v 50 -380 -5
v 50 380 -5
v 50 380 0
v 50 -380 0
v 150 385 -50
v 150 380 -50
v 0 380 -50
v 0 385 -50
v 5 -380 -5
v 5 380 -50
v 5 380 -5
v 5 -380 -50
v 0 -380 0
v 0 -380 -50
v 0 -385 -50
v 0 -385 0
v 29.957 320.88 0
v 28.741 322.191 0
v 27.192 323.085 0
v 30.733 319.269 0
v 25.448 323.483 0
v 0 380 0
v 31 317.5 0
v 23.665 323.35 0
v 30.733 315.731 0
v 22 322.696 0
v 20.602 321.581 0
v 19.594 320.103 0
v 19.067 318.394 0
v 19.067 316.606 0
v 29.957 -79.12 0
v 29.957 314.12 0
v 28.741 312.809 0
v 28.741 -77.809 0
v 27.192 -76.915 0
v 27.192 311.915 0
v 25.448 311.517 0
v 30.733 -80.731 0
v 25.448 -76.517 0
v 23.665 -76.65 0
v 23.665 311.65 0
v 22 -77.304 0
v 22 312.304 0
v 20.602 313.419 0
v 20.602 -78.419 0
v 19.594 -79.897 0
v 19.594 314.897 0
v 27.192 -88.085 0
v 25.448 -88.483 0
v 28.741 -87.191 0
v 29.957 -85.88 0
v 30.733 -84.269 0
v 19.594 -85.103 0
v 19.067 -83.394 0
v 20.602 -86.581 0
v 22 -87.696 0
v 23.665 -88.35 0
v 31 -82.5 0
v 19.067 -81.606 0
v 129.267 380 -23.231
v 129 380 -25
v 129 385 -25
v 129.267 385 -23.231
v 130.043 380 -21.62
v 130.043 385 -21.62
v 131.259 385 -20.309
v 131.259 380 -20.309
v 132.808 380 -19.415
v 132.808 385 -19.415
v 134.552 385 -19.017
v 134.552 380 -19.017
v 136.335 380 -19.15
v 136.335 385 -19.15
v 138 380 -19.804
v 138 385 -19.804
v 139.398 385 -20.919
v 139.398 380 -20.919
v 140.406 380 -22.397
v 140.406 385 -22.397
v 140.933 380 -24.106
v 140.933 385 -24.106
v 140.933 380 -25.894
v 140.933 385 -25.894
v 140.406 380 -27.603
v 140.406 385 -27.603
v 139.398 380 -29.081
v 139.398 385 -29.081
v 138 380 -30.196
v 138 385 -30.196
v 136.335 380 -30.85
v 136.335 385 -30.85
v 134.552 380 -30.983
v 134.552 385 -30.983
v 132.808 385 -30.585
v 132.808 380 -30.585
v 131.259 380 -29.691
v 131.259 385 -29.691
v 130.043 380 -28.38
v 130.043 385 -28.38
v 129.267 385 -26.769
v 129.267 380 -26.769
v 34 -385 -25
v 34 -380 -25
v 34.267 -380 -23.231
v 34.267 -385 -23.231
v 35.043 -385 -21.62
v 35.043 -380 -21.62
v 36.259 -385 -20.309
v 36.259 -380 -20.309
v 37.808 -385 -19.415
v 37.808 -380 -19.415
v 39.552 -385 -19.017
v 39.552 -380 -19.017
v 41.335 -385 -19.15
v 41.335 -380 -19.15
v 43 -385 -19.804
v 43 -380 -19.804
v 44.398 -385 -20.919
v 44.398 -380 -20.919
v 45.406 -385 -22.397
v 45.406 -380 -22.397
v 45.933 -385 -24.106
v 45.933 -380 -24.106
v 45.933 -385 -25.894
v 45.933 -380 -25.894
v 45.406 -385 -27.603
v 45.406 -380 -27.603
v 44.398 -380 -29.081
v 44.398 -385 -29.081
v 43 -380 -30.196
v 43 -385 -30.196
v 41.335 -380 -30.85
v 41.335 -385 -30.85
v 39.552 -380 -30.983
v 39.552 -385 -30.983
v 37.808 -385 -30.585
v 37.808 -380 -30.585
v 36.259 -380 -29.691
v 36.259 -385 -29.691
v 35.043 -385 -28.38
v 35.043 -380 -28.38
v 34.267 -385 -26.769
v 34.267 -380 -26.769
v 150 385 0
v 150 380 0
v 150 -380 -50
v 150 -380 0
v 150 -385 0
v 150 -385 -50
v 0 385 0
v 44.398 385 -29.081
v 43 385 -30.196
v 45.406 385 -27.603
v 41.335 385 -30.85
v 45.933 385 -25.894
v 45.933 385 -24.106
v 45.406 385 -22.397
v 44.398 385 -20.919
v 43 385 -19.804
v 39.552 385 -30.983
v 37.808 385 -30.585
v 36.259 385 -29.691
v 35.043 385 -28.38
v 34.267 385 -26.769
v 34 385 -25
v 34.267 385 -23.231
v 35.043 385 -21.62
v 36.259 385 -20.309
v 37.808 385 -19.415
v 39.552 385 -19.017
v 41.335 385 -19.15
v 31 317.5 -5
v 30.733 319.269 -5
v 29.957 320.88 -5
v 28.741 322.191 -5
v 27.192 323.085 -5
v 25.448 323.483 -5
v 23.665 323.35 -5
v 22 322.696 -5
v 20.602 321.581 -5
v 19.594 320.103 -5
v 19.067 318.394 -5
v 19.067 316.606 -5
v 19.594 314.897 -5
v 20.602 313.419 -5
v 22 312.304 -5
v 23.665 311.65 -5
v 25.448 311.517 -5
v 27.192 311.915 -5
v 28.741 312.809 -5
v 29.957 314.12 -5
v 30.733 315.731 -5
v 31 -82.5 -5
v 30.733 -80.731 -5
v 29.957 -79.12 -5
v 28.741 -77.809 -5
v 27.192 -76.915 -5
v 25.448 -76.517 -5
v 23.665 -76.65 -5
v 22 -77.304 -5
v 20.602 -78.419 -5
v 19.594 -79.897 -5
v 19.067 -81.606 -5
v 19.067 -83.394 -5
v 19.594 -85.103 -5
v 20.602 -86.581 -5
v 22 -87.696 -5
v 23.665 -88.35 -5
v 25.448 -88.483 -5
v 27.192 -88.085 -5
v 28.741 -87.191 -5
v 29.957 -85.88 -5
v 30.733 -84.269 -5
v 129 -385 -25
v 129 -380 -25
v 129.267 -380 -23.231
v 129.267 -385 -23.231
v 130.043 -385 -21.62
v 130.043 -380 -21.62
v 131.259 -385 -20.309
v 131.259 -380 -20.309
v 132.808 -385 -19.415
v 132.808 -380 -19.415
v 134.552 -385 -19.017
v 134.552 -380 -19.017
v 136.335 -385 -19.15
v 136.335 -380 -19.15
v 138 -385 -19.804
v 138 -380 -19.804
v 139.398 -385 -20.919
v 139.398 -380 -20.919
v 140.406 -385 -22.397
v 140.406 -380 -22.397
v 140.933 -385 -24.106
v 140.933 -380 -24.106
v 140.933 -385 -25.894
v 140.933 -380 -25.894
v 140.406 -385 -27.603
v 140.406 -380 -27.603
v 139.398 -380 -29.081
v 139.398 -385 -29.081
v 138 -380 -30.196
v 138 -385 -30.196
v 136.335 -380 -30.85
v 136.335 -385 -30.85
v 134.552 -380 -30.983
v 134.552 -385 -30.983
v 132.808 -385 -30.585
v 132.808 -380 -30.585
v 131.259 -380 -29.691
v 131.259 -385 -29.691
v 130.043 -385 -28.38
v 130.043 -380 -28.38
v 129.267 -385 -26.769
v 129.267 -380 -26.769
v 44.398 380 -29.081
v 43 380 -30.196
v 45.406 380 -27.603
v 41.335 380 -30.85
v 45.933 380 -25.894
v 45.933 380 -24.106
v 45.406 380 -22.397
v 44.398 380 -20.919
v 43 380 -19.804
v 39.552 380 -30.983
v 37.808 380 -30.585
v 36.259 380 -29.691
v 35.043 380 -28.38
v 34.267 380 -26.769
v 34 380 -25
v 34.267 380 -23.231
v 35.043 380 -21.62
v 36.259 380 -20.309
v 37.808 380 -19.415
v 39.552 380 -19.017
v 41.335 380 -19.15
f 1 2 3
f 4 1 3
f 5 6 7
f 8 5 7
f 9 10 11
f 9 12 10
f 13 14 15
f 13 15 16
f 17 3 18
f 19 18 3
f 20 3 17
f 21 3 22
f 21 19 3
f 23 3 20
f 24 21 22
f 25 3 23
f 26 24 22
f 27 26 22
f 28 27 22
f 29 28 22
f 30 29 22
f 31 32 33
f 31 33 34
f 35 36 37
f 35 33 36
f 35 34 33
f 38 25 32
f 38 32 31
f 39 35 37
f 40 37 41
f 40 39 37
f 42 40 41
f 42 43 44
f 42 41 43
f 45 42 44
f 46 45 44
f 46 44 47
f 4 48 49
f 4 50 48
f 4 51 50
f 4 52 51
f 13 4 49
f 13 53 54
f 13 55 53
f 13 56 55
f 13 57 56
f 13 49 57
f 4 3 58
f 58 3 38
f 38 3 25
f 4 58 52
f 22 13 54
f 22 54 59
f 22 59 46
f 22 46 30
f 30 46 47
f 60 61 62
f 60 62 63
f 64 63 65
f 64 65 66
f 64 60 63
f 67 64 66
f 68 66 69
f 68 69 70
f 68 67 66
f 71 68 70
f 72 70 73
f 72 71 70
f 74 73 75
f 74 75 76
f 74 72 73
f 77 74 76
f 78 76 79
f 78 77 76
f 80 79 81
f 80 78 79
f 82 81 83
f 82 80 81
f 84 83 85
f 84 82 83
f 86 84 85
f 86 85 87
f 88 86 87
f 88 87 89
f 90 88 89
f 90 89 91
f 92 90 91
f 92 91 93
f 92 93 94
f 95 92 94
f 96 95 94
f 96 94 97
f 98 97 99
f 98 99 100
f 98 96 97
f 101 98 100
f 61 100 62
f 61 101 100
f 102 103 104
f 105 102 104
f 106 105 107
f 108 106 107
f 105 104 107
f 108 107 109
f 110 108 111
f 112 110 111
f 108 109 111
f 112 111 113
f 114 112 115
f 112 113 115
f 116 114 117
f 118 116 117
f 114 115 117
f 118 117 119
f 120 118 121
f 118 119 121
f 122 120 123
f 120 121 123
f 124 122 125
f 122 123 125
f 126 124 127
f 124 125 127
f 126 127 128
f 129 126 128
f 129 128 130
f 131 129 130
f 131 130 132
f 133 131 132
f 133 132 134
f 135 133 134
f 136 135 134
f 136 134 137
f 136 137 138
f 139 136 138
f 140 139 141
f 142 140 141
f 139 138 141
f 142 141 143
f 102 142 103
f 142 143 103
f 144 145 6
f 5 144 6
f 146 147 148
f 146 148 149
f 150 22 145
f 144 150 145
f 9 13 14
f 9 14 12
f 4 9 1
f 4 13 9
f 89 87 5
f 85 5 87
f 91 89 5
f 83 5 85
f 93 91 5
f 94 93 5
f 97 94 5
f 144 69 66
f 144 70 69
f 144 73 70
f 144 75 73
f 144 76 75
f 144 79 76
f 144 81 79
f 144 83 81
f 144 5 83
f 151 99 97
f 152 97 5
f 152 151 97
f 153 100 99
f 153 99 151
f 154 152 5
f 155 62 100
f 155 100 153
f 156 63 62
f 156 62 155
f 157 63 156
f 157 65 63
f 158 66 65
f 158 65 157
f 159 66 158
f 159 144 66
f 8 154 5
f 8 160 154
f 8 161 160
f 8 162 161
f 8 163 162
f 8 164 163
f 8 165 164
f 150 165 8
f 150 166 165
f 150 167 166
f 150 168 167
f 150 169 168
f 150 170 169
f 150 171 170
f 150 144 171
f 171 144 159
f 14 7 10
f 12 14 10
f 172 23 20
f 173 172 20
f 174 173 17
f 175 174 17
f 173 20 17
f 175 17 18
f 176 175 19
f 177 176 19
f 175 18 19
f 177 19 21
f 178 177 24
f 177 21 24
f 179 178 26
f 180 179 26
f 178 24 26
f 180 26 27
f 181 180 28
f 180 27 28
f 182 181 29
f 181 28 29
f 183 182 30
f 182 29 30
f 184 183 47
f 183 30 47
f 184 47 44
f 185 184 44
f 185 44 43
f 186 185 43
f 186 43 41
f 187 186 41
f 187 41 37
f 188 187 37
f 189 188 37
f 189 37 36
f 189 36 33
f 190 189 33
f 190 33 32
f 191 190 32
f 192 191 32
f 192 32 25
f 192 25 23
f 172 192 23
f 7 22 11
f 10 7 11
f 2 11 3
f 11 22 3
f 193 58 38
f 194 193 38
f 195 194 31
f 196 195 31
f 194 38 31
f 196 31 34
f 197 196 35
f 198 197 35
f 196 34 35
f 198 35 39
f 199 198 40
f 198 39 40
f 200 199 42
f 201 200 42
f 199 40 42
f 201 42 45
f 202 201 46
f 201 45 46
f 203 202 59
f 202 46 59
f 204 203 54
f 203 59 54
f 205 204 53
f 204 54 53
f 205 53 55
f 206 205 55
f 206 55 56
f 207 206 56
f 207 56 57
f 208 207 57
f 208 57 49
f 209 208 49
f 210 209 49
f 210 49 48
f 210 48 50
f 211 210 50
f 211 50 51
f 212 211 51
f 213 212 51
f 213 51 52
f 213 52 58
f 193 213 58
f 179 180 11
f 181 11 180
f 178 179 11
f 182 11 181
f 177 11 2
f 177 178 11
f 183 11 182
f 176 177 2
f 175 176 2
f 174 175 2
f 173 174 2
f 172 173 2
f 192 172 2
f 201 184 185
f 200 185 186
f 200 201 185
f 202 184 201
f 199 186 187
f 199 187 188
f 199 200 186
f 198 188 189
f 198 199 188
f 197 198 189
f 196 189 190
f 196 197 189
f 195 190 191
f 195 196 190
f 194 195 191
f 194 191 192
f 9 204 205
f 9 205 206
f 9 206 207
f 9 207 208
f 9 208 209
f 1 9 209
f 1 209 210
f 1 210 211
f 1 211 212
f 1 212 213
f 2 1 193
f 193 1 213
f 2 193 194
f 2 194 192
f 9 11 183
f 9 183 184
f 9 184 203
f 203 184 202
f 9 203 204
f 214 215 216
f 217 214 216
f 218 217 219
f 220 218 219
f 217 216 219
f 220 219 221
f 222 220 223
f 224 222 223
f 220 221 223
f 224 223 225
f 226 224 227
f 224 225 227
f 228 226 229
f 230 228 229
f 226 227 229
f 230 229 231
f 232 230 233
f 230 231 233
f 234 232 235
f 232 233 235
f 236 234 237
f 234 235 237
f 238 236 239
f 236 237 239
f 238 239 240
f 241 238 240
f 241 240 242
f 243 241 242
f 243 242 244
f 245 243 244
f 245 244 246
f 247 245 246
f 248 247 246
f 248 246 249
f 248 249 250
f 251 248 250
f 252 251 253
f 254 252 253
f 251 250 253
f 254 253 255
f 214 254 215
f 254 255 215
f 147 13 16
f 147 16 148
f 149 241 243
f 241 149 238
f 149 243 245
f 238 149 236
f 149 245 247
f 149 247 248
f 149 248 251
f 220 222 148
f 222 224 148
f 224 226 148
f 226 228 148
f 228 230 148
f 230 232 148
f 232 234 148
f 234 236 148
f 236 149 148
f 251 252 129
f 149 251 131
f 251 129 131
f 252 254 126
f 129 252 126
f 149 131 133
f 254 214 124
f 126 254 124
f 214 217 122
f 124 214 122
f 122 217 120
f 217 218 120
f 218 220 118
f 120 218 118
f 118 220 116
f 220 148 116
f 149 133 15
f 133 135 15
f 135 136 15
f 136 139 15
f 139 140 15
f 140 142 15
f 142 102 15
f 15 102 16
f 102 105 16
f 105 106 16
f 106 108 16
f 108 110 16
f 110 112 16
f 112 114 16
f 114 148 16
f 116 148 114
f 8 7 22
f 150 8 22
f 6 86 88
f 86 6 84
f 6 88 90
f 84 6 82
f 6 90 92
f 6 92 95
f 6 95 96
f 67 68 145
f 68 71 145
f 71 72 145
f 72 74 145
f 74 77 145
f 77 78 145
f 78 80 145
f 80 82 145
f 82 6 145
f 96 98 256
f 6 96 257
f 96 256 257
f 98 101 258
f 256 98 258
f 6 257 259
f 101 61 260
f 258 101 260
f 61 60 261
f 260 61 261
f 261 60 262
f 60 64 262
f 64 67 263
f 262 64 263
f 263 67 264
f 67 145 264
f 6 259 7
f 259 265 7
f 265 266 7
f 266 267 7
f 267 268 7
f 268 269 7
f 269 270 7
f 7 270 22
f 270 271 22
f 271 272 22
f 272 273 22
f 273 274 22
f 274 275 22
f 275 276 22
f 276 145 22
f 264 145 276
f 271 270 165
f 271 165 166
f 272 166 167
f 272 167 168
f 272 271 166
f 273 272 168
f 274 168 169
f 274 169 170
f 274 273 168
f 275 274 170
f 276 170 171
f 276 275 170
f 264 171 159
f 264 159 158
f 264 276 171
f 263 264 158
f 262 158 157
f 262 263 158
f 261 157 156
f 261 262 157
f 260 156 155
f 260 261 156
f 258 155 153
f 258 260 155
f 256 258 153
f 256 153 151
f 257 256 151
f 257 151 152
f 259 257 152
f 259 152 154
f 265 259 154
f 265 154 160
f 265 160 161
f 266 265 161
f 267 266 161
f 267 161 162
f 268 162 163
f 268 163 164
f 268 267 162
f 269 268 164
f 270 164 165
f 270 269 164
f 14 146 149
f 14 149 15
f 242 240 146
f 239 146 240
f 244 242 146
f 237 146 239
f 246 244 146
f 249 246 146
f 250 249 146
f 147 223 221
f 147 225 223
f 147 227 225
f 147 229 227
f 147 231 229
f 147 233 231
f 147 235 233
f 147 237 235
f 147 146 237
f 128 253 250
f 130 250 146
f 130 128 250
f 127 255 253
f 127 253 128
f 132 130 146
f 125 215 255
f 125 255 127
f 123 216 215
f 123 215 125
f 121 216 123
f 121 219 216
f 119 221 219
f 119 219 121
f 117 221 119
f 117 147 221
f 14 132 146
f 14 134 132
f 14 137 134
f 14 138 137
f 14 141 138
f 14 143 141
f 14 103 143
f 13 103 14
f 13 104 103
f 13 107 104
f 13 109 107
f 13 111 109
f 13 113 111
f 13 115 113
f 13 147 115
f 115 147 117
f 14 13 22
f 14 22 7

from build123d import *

# Parameters (mm, degrees)
F1_DEPTH = 380
F2_R     = 6
F3_DEPTH = 5
F5_R     = 6
F6_DEPTH = 50.001


with BuildPart() as f1:
    # F0 (on Front) → F1 (new body, symmetric)
    with BuildSketch(Plane.XZ):
        Polygon((5, -5), (50, -5), (50, 0), (0, 0), (0, -50), (5, -50), align=None)
    extrude(amount=F1_DEPTH, both=True)

    # F5 (on face) → F6 (cut, through all)
    with BuildSketch(Plane.XY):
        with Locations((25, 317.5)):
            Circle(F5_R)
        with Locations((25, -82.5)):
            Circle(F5_R)
    extrude(amount=-F6_DEPTH, mode=Mode.SUBTRACT)


with BuildPart() as f3:
    # F2 (on face) → F3 (new body)
    with BuildSketch(Plane(origin=(0, 380, 0), x_dir=(-1, 0, 0), z_dir=(0, 1, 0))):
        Polygon((-50, 0), (-150, 0), (-150, -50), (-5, -50), (-5, -5), (-50, -5), align=None)
        with Locations((-135, -25)):
            Circle(F2_R, mode=Mode.SUBTRACT)
        with Locations((-40, -25)):
            Circle(F2_R, mode=Mode.SUBTRACT)
        Polygon((0, 0), (-50, 0), (-50, -5), (-5, -5), (-5, -50), (0, -50), align=None)
    extrude(amount=F3_DEPTH)


with BuildPart() as f4_1:
    # F4: instance of F3
    add(f3.part.mirror(Plane.XZ))


solid = Compound([f1.part, f3.part, f4_1.part])
